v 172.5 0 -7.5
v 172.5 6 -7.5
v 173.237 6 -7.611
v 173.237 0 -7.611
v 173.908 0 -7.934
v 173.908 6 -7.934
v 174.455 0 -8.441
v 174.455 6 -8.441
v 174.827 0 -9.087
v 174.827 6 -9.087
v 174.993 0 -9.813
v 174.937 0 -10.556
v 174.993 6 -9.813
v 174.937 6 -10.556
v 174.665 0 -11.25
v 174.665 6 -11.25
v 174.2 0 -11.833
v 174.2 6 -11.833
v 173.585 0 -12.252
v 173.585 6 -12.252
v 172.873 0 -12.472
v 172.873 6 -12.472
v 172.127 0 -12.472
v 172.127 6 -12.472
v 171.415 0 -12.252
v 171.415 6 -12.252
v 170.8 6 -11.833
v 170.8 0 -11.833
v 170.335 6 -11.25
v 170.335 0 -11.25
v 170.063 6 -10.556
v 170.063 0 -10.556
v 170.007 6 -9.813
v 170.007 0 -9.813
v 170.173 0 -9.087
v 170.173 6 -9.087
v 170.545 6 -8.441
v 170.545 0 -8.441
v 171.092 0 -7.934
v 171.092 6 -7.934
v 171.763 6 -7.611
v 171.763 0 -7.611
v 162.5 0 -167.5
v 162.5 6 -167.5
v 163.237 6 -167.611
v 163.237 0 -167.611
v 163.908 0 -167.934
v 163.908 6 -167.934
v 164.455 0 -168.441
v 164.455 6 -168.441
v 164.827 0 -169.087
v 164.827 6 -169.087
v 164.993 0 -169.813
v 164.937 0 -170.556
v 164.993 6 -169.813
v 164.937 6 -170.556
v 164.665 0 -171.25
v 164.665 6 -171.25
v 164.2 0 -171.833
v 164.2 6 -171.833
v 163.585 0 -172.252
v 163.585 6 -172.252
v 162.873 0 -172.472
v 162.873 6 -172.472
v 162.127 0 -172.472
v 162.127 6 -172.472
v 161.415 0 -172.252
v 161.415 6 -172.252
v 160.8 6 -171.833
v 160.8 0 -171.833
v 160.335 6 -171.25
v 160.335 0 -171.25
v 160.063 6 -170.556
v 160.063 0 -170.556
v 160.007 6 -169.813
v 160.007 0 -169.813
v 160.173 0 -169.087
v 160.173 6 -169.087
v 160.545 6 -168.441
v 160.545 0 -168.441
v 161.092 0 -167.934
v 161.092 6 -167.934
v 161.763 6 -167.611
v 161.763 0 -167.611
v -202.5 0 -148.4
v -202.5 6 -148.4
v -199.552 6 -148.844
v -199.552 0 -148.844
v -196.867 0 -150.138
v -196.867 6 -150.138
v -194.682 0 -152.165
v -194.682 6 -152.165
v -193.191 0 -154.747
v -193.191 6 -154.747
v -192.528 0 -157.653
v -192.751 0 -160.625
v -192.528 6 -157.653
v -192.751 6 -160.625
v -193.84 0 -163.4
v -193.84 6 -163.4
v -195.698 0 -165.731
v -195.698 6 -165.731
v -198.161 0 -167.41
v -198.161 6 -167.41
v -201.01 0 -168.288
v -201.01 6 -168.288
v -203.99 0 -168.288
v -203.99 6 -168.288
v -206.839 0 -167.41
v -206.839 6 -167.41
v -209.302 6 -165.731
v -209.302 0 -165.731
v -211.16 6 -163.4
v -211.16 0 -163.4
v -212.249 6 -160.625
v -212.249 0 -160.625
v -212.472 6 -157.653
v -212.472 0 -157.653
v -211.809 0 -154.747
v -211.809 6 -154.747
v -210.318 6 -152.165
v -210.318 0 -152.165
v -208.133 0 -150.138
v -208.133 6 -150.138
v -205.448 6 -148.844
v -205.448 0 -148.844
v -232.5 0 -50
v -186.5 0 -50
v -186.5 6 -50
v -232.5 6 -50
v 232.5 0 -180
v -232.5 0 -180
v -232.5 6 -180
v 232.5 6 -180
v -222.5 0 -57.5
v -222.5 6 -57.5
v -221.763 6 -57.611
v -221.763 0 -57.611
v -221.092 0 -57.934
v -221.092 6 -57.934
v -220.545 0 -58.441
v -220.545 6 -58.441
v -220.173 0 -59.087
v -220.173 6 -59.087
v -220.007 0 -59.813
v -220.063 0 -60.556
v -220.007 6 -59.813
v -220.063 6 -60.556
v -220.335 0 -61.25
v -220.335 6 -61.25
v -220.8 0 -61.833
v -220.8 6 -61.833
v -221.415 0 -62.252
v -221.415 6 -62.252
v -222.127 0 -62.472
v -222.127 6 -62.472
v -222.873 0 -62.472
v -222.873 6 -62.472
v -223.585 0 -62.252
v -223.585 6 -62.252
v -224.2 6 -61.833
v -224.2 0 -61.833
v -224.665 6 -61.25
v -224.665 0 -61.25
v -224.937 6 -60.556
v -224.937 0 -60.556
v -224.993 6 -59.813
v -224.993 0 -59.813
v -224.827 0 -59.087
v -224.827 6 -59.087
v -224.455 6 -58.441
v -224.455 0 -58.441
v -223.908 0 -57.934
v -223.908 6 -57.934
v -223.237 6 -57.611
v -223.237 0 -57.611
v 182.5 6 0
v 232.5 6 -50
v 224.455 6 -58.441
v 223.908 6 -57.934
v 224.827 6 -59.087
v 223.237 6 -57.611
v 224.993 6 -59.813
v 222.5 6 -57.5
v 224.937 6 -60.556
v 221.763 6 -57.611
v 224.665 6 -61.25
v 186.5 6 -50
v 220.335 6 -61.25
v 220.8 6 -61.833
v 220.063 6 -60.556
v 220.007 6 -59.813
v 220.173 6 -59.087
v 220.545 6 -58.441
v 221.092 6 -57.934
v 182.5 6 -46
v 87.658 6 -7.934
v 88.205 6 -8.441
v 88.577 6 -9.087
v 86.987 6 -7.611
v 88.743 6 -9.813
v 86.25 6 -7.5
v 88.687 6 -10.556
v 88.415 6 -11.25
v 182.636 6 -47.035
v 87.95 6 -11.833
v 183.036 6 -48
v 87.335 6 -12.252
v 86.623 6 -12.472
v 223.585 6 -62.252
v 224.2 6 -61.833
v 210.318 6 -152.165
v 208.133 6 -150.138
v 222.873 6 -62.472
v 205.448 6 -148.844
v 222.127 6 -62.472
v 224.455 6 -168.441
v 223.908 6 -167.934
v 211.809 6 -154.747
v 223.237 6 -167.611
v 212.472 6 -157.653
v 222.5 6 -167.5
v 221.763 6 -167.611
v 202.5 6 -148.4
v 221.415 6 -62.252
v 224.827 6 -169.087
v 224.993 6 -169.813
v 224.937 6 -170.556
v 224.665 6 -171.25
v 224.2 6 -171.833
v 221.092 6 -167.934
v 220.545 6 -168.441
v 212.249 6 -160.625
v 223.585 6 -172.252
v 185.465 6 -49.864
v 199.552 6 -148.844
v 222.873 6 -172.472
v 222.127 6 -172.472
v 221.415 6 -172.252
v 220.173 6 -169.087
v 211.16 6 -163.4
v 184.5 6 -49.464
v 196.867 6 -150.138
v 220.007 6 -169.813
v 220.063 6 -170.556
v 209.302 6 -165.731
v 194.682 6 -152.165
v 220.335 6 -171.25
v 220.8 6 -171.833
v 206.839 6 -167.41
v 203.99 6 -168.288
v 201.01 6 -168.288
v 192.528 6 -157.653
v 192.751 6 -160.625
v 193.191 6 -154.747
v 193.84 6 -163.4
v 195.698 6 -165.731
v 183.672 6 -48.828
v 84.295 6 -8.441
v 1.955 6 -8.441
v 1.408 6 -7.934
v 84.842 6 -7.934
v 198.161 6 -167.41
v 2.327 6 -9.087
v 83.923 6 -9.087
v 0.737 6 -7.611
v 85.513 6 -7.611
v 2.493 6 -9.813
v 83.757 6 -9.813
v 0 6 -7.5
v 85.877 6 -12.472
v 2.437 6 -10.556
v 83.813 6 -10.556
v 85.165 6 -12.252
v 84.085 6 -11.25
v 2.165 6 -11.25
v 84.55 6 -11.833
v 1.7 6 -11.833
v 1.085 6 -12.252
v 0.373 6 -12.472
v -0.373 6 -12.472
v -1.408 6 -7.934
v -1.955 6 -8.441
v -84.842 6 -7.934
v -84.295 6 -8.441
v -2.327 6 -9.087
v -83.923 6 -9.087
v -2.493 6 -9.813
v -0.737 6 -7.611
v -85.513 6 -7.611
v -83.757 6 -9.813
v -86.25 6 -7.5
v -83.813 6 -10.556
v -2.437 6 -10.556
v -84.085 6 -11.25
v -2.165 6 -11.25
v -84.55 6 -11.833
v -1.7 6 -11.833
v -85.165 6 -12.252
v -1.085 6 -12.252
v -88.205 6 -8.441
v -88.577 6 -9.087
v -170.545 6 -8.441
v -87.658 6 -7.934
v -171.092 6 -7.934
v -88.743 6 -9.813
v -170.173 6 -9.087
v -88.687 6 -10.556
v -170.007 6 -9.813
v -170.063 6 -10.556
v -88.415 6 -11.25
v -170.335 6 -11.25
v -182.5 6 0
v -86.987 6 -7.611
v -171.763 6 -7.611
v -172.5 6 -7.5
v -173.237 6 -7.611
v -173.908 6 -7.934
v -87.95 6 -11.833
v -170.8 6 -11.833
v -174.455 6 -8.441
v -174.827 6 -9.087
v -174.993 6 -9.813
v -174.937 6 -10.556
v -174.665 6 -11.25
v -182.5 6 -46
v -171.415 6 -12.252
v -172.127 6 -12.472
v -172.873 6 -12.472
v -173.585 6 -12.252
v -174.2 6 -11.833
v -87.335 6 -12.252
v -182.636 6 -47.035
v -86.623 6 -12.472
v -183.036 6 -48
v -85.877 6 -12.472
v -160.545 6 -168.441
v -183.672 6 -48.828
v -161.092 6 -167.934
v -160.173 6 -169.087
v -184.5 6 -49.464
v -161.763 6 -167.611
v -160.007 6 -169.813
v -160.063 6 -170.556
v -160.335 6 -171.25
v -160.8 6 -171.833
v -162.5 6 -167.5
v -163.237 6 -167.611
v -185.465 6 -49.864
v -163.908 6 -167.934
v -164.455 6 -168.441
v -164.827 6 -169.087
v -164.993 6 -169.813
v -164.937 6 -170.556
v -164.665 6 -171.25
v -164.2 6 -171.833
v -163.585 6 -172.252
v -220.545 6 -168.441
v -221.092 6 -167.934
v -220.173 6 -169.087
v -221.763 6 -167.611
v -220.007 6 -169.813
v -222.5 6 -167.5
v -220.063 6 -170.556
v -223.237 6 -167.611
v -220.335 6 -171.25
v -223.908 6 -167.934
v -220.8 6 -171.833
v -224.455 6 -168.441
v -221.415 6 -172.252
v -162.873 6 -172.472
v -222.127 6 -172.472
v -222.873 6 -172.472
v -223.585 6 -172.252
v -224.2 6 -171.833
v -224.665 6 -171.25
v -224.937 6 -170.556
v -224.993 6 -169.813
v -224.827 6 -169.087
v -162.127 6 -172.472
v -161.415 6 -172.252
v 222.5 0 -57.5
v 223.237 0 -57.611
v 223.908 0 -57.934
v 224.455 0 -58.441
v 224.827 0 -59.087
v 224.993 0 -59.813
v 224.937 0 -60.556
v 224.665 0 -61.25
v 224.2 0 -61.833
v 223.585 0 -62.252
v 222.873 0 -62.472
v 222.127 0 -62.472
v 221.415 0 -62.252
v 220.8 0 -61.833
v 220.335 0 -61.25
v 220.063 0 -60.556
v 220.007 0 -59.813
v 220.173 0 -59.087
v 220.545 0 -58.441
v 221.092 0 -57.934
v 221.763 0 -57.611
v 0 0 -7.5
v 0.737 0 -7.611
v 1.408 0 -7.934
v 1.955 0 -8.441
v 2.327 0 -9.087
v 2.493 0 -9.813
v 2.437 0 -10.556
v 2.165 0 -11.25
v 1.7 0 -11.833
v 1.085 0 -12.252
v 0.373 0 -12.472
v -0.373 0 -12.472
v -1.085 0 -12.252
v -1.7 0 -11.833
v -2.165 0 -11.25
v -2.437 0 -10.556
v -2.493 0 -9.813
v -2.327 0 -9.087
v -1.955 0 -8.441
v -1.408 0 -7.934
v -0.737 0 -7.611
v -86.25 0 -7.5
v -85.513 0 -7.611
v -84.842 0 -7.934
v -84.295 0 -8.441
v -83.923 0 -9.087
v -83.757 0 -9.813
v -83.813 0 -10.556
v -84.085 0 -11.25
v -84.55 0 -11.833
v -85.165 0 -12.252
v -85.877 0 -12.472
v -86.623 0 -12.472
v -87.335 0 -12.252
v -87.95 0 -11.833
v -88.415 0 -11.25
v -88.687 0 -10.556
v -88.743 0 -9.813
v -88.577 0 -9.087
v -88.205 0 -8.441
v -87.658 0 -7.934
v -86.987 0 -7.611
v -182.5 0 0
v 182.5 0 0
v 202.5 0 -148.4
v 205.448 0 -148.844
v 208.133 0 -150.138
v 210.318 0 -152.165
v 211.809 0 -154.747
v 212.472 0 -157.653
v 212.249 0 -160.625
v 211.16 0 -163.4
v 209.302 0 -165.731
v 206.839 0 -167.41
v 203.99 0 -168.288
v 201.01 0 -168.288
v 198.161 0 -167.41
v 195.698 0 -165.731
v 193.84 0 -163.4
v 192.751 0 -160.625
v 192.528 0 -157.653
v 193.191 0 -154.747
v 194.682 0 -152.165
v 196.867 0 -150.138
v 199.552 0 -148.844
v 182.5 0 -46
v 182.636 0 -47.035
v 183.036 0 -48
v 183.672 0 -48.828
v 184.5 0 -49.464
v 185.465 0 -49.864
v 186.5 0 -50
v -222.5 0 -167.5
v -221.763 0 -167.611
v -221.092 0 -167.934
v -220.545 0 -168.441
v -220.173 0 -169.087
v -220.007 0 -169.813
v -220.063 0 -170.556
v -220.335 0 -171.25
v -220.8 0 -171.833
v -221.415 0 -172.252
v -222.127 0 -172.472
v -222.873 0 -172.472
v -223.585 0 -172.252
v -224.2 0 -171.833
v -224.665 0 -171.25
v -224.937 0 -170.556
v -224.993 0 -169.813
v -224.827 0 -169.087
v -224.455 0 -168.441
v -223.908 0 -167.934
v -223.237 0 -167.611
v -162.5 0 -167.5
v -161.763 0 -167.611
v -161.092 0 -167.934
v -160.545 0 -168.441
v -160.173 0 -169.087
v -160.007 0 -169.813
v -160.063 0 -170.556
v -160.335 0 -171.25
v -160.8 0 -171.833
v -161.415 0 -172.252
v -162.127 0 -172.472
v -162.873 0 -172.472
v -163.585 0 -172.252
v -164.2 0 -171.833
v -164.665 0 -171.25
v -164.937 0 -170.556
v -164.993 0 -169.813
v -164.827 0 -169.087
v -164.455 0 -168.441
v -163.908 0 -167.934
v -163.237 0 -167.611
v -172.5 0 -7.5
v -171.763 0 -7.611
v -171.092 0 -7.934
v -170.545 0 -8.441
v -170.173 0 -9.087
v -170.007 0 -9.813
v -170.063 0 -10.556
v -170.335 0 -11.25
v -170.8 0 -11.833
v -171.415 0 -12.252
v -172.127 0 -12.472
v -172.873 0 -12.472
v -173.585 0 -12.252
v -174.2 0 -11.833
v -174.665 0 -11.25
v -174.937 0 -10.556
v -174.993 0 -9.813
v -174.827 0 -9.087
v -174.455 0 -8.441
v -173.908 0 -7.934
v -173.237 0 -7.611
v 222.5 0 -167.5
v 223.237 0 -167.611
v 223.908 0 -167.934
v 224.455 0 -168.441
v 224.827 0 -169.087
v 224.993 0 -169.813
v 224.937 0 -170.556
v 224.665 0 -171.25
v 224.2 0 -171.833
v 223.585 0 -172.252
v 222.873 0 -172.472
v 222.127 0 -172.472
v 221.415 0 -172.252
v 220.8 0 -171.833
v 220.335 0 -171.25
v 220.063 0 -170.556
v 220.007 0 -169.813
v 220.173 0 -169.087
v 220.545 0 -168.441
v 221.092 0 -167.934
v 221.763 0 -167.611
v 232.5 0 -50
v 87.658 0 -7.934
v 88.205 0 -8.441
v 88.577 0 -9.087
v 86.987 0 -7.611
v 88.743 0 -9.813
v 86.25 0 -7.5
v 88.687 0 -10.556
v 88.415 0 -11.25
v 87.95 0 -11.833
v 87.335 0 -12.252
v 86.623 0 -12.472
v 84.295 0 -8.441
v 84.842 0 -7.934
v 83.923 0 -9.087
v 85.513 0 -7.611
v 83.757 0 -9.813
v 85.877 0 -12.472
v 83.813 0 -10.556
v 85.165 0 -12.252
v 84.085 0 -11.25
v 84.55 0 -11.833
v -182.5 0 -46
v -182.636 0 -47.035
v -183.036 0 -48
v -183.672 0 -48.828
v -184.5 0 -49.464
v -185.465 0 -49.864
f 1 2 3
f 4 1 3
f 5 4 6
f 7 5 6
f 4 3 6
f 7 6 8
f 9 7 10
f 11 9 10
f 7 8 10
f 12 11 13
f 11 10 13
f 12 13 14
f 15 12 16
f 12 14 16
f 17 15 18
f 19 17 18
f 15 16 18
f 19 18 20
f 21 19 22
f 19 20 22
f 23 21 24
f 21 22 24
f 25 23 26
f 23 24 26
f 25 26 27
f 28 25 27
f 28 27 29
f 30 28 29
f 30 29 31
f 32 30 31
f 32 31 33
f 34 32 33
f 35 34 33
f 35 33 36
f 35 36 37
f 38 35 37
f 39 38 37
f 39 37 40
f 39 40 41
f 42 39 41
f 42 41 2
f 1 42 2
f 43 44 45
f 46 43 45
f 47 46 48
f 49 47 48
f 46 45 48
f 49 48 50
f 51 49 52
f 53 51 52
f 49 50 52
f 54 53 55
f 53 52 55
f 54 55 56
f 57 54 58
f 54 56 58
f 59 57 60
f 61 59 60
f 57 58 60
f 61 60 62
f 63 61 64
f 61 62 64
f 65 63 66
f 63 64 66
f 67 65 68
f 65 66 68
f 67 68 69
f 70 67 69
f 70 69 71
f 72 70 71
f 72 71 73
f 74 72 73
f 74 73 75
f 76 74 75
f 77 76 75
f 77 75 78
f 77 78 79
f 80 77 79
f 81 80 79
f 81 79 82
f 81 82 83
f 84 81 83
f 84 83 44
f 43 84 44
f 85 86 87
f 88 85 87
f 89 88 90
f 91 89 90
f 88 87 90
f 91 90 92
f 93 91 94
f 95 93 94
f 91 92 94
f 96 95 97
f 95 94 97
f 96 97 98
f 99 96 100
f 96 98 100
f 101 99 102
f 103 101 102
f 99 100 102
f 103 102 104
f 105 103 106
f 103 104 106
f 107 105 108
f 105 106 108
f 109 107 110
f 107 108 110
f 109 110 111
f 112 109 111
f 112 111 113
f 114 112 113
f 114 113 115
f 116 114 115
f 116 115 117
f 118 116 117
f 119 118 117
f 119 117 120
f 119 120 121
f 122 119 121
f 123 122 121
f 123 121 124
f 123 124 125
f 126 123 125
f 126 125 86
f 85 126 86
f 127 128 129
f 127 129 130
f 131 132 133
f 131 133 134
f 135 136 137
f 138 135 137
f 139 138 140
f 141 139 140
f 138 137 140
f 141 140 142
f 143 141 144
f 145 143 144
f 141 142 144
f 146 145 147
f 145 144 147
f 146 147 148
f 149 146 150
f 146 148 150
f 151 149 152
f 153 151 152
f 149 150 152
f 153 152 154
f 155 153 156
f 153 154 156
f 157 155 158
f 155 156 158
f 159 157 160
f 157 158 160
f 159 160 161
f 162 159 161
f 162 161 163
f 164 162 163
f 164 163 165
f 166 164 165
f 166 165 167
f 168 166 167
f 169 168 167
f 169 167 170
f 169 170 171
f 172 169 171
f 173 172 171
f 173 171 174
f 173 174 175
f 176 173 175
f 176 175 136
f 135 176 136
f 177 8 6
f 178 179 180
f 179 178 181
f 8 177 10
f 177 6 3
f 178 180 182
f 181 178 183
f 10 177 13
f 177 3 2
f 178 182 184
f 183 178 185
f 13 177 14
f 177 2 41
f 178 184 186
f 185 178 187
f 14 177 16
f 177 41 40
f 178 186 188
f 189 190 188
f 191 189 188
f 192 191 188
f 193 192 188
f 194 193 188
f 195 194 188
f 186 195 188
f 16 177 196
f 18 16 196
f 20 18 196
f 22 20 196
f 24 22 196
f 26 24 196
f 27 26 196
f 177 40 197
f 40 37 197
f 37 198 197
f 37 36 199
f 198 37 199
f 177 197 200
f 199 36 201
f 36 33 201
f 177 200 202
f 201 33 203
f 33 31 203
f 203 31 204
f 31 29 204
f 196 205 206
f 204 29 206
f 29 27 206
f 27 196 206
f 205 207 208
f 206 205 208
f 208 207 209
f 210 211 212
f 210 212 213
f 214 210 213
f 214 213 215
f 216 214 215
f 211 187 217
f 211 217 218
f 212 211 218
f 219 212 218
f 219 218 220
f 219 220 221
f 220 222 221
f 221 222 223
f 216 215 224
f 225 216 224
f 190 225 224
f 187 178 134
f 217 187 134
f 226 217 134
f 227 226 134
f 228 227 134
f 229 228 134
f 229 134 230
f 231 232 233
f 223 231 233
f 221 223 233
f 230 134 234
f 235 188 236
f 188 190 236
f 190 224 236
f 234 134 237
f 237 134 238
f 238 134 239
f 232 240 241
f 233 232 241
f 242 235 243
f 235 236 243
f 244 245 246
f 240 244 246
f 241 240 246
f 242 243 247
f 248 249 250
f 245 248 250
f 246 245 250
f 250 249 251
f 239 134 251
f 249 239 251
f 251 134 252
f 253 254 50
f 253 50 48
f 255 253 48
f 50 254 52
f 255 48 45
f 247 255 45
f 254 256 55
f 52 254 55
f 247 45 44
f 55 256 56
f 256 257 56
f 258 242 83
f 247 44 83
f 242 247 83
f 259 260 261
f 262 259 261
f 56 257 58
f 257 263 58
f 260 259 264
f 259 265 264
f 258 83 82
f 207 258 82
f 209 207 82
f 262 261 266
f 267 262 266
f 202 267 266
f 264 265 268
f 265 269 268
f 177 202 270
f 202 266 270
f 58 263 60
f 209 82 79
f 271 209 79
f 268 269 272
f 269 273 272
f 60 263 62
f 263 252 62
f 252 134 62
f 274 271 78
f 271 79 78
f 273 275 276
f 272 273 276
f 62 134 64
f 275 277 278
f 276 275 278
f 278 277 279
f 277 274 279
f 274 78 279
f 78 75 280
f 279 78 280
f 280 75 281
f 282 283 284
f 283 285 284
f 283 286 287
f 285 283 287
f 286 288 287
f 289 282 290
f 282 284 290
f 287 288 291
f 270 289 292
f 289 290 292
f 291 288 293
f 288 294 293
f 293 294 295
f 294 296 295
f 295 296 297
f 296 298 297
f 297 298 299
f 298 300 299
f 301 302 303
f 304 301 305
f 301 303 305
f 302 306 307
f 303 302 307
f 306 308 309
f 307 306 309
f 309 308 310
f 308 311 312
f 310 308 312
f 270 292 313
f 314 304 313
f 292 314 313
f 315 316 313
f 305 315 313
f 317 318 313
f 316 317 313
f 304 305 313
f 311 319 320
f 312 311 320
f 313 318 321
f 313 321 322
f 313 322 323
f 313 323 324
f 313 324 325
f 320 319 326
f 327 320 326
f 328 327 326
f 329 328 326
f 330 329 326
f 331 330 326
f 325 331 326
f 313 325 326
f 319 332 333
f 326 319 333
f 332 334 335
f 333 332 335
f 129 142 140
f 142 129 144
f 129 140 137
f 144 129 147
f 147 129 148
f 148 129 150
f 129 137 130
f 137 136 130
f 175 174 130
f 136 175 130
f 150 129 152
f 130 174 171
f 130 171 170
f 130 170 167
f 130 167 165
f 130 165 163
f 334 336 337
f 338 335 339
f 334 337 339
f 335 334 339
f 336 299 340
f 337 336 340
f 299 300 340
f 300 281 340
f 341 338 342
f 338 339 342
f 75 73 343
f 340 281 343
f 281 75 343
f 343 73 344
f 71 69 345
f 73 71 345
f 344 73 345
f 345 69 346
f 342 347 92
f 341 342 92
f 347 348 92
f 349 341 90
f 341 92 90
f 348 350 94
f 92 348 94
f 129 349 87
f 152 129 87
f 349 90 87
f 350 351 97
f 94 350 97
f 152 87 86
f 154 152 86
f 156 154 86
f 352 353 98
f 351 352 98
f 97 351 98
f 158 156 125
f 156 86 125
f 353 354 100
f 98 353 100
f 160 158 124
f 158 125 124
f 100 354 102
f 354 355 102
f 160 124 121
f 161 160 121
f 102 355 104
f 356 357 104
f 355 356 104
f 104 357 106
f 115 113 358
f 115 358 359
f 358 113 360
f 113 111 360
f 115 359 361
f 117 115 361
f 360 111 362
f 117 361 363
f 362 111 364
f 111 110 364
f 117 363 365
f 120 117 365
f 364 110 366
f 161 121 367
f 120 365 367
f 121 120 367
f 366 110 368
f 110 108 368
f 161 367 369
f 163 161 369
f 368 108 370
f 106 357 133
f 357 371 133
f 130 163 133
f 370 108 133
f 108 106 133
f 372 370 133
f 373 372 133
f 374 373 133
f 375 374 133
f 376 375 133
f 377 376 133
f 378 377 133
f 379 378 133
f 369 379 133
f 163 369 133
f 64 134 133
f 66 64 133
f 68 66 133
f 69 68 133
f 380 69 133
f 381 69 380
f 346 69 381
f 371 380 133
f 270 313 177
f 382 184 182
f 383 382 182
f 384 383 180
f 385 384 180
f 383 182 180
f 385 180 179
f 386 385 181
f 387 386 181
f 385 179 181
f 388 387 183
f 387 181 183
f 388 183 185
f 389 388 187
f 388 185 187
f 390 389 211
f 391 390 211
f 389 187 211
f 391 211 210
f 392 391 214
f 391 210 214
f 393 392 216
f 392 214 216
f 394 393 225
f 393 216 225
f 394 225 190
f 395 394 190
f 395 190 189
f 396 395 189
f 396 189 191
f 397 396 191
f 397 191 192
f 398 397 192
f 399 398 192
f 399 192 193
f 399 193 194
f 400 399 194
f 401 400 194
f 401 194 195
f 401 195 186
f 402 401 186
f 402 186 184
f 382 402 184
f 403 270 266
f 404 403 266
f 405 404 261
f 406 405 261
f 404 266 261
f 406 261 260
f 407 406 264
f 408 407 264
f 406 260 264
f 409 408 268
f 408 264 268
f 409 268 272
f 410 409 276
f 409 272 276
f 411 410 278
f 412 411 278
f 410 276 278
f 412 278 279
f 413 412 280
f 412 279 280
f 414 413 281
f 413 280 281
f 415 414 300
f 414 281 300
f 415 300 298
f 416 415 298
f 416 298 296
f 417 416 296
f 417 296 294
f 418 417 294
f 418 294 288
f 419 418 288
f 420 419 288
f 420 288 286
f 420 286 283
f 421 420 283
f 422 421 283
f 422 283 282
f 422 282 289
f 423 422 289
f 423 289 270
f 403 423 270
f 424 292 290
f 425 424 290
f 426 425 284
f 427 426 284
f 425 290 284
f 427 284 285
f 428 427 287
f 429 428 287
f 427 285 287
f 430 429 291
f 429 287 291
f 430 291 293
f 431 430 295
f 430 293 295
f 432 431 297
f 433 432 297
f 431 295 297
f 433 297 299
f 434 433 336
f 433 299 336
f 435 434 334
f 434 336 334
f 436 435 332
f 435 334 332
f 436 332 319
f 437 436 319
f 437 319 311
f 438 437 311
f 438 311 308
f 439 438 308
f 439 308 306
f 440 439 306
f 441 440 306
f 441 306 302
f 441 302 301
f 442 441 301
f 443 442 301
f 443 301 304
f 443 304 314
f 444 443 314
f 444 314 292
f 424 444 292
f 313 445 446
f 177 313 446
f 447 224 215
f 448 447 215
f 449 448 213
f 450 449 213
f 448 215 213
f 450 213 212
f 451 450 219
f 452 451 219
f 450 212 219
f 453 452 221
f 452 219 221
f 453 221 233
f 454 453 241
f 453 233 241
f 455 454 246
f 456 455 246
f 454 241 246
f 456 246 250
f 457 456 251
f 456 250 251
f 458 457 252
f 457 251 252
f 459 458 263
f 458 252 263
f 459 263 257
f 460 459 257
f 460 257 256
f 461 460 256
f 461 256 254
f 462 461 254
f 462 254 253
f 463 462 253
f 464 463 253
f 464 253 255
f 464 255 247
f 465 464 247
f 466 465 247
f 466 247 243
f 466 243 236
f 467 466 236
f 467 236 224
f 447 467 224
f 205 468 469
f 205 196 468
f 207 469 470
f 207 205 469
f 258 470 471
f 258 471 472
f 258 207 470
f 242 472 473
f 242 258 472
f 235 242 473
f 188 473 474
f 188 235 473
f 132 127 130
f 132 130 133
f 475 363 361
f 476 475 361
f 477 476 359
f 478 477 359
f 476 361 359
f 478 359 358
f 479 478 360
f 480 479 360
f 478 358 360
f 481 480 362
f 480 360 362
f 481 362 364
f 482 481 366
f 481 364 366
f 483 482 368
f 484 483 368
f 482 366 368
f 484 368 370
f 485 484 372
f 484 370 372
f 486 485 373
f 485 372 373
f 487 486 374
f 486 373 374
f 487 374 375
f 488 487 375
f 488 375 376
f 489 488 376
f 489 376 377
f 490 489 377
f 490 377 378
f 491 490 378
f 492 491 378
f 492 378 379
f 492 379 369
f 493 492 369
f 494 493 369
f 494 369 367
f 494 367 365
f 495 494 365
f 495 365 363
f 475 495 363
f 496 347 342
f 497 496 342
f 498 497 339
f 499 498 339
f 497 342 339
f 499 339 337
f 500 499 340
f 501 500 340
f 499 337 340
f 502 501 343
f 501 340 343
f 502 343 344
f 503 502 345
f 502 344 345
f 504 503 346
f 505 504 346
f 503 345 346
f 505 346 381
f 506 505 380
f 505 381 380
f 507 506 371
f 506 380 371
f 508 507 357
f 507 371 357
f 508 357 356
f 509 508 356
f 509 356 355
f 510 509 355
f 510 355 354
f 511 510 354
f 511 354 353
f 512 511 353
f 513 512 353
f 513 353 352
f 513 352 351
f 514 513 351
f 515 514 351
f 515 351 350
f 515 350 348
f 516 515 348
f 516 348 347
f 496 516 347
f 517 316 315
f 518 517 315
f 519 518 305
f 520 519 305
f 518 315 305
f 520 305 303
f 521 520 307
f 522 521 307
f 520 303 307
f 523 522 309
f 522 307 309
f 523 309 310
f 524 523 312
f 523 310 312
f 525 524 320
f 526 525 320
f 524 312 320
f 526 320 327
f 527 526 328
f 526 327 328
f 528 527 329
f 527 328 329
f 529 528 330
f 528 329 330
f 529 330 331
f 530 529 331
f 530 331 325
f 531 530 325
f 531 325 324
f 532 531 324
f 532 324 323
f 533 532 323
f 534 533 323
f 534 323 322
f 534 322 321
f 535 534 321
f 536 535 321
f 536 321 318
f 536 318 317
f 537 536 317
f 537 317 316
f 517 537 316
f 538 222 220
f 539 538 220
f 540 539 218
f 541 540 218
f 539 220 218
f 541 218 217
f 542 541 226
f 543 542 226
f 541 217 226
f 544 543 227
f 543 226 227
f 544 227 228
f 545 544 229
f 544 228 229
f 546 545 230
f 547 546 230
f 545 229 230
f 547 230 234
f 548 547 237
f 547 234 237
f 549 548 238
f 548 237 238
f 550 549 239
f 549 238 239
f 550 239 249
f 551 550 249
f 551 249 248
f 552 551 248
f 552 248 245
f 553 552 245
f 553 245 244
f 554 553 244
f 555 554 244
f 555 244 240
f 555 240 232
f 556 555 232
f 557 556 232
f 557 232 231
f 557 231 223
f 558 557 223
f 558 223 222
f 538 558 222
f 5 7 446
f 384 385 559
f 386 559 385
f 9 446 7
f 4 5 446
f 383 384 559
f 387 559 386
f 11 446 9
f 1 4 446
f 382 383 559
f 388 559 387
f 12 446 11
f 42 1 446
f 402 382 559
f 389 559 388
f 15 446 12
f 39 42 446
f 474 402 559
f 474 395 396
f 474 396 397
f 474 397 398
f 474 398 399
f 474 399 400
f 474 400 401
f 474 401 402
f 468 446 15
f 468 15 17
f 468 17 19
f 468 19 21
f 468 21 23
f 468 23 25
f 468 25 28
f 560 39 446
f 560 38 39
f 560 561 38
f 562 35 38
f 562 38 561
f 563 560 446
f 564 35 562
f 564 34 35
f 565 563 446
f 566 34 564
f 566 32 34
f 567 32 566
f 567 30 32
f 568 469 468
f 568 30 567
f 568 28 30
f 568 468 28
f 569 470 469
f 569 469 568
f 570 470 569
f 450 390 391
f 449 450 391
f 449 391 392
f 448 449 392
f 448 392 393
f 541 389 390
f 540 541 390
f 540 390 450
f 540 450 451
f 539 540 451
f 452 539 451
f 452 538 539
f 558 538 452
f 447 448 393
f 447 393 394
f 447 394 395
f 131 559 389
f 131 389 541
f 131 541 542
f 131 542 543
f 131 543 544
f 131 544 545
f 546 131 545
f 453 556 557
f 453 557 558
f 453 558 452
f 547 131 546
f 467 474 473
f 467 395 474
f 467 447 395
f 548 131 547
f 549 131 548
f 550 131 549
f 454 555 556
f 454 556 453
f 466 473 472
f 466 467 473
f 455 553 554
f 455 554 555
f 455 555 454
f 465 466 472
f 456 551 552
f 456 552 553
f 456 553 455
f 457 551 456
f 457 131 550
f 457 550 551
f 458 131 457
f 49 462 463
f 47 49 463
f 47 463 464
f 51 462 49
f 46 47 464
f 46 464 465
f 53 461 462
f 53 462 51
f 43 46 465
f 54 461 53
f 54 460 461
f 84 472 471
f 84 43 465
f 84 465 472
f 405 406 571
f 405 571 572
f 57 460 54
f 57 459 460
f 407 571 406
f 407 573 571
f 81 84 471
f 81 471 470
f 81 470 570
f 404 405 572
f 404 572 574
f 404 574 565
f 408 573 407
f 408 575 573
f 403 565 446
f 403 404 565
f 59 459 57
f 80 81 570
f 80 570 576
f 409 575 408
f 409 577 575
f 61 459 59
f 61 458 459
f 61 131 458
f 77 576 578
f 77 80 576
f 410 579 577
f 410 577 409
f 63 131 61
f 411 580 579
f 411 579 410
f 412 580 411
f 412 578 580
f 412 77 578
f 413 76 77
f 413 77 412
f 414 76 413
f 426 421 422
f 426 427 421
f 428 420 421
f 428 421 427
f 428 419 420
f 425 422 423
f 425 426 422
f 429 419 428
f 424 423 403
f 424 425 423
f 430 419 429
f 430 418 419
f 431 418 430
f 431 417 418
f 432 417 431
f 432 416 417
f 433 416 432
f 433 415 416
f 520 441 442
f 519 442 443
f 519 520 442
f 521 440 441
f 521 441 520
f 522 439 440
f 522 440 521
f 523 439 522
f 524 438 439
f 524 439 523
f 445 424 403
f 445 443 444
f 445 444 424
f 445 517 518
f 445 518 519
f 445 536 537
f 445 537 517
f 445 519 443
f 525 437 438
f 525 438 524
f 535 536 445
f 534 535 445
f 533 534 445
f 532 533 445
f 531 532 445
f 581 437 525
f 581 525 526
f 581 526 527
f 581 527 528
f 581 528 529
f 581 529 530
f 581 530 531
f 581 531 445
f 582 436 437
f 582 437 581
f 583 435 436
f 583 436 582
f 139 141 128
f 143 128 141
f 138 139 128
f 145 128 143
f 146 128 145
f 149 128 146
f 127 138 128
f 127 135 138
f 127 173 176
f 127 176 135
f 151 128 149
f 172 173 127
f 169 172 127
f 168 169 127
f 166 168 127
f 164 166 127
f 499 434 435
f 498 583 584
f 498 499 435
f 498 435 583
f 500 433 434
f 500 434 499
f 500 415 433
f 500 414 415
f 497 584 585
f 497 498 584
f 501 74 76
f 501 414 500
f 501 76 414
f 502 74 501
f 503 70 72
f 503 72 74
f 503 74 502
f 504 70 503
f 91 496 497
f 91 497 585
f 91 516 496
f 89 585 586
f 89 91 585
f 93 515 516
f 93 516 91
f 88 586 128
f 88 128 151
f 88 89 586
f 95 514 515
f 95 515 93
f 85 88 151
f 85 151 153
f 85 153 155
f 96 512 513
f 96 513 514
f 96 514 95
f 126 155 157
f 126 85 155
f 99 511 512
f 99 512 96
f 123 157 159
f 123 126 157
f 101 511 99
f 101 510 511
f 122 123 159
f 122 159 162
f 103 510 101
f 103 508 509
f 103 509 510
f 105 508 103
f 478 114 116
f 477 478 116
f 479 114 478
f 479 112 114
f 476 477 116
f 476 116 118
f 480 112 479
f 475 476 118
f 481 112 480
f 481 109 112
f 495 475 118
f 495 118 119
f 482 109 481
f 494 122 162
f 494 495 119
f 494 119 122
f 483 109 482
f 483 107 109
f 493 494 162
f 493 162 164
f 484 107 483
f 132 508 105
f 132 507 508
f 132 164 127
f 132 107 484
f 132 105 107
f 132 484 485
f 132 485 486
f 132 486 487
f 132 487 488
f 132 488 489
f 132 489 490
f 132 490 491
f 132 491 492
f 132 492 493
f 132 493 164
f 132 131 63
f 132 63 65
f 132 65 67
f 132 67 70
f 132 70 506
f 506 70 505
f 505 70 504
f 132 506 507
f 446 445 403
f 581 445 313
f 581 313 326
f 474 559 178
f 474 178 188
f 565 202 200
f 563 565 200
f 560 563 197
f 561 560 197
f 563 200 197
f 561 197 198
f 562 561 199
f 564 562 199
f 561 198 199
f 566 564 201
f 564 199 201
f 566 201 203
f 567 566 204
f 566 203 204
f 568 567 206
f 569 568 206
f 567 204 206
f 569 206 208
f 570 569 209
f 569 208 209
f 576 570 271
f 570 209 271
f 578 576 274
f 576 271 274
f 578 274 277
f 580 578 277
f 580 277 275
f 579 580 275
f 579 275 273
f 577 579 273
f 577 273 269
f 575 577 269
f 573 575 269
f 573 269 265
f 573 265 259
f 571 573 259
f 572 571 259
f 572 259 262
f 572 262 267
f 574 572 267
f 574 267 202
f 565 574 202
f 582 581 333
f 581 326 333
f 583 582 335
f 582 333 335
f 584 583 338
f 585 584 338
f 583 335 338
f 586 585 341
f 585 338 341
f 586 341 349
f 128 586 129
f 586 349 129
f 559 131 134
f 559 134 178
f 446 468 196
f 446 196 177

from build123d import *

# Parameters (mm, degrees)
BOSS_EXTRUDE1_DEPTH = 6
SKETCH2_R           = 2.5
CUT_EXTRUDE1_DEPTH  = 295.095647707
FILLET1_R           = 4
SKETCH3_R           = 10
CUT_EXTRUDE2_DEPTH  = 295.095647707


with BuildPart() as part:
    # Sketch1 → Boss-Extrude1 (new body)
    with BuildSketch(Plane(origin=(0, 0, 0), x_dir=(1, 0, 0), z_dir=(0, 1, 0))):
        Polygon((0, 0), (-182.5, 0), (-182.5, 50), (-232.5, 50), (-232.5, 180), (232.5, 180), (232.5, 50), (182.5, 50), (182.5, 0), align=None)
    extrude(amount=BOSS_EXTRUDE1_DEPTH)

    # Sketch2 → Cut-Extrude1 (cut, through all)
    with BuildSketch(Plane(origin=(0, 6, 0), x_dir=(1, 0, 0), z_dir=(0, 1, 0))):
        with Locations(Location((-222.5, 170, 0), (0, 0, 270))):
            Circle(SKETCH2_R)
        with Locations(Location((-222.5, 60, 0), (0, 0, 270))):
            Circle(SKETCH2_R)
        with Locations(Location((222.5, 170, 0), (0, 0, 270))):
            Circle(SKETCH2_R)
        with Locations(Location((222.5, 60, 0), (0, 0, 270))):
            Circle(SKETCH2_R)
        with Locations(Location((-172.5, 10, 0), (0, 0, 270))):
            Circle(SKETCH2_R)
        with Locations(Location((-86.25, 10, 0), (0, 0, 270))):
            Circle(SKETCH2_R)
        with Locations(Location((0, 10, 0), (0, 0, 270))):
            Circle(SKETCH2_R)
        with Locations(Location((86.25, 10, 0), (0, 0, 270))):
            Circle(SKETCH2_R)
        with Locations(Location((172.5, 10, 0), (0, 0, 270))):
            Circle(SKETCH2_R)
        with Locations(Location((-162.5, 170, 0), (0, 0, 270))):
            Circle(SKETCH2_R)
        with Locations(Location((162.5, 170, 0), (0, 0, 270))):
            Circle(SKETCH2_R)
    extrude(amount=-CUT_EXTRUDE1_DEPTH, mode=Mode.SUBTRACT)

    # Fillet1
    fillet1_edges = [part.edges().sort_by_distance(p)[0] for p in [
        (-182.5, 3, -50),
        (182.5, 3, -50),
    ]]
    fillet(fillet1_edges, radius=FILLET1_R)

    # Sketch3 → Cut-Extrude2 (cut, through all)
    with BuildSketch(Plane(origin=(0, 6, 0), x_dir=(1, 0, 0), z_dir=(0, 1, 0))):
        with Locations(Location((-202.5, 158.4, 0), (0, 0, 270))):
            Circle(SKETCH3_R)
        with Locations(Location((202.5, 158.4, 0), (0, 0, 270))):
            Circle(SKETCH3_R)
    extrude(amount=-CUT_EXTRUDE2_DEPTH, mode=Mode.SUBTRACT)


solid = part.part
